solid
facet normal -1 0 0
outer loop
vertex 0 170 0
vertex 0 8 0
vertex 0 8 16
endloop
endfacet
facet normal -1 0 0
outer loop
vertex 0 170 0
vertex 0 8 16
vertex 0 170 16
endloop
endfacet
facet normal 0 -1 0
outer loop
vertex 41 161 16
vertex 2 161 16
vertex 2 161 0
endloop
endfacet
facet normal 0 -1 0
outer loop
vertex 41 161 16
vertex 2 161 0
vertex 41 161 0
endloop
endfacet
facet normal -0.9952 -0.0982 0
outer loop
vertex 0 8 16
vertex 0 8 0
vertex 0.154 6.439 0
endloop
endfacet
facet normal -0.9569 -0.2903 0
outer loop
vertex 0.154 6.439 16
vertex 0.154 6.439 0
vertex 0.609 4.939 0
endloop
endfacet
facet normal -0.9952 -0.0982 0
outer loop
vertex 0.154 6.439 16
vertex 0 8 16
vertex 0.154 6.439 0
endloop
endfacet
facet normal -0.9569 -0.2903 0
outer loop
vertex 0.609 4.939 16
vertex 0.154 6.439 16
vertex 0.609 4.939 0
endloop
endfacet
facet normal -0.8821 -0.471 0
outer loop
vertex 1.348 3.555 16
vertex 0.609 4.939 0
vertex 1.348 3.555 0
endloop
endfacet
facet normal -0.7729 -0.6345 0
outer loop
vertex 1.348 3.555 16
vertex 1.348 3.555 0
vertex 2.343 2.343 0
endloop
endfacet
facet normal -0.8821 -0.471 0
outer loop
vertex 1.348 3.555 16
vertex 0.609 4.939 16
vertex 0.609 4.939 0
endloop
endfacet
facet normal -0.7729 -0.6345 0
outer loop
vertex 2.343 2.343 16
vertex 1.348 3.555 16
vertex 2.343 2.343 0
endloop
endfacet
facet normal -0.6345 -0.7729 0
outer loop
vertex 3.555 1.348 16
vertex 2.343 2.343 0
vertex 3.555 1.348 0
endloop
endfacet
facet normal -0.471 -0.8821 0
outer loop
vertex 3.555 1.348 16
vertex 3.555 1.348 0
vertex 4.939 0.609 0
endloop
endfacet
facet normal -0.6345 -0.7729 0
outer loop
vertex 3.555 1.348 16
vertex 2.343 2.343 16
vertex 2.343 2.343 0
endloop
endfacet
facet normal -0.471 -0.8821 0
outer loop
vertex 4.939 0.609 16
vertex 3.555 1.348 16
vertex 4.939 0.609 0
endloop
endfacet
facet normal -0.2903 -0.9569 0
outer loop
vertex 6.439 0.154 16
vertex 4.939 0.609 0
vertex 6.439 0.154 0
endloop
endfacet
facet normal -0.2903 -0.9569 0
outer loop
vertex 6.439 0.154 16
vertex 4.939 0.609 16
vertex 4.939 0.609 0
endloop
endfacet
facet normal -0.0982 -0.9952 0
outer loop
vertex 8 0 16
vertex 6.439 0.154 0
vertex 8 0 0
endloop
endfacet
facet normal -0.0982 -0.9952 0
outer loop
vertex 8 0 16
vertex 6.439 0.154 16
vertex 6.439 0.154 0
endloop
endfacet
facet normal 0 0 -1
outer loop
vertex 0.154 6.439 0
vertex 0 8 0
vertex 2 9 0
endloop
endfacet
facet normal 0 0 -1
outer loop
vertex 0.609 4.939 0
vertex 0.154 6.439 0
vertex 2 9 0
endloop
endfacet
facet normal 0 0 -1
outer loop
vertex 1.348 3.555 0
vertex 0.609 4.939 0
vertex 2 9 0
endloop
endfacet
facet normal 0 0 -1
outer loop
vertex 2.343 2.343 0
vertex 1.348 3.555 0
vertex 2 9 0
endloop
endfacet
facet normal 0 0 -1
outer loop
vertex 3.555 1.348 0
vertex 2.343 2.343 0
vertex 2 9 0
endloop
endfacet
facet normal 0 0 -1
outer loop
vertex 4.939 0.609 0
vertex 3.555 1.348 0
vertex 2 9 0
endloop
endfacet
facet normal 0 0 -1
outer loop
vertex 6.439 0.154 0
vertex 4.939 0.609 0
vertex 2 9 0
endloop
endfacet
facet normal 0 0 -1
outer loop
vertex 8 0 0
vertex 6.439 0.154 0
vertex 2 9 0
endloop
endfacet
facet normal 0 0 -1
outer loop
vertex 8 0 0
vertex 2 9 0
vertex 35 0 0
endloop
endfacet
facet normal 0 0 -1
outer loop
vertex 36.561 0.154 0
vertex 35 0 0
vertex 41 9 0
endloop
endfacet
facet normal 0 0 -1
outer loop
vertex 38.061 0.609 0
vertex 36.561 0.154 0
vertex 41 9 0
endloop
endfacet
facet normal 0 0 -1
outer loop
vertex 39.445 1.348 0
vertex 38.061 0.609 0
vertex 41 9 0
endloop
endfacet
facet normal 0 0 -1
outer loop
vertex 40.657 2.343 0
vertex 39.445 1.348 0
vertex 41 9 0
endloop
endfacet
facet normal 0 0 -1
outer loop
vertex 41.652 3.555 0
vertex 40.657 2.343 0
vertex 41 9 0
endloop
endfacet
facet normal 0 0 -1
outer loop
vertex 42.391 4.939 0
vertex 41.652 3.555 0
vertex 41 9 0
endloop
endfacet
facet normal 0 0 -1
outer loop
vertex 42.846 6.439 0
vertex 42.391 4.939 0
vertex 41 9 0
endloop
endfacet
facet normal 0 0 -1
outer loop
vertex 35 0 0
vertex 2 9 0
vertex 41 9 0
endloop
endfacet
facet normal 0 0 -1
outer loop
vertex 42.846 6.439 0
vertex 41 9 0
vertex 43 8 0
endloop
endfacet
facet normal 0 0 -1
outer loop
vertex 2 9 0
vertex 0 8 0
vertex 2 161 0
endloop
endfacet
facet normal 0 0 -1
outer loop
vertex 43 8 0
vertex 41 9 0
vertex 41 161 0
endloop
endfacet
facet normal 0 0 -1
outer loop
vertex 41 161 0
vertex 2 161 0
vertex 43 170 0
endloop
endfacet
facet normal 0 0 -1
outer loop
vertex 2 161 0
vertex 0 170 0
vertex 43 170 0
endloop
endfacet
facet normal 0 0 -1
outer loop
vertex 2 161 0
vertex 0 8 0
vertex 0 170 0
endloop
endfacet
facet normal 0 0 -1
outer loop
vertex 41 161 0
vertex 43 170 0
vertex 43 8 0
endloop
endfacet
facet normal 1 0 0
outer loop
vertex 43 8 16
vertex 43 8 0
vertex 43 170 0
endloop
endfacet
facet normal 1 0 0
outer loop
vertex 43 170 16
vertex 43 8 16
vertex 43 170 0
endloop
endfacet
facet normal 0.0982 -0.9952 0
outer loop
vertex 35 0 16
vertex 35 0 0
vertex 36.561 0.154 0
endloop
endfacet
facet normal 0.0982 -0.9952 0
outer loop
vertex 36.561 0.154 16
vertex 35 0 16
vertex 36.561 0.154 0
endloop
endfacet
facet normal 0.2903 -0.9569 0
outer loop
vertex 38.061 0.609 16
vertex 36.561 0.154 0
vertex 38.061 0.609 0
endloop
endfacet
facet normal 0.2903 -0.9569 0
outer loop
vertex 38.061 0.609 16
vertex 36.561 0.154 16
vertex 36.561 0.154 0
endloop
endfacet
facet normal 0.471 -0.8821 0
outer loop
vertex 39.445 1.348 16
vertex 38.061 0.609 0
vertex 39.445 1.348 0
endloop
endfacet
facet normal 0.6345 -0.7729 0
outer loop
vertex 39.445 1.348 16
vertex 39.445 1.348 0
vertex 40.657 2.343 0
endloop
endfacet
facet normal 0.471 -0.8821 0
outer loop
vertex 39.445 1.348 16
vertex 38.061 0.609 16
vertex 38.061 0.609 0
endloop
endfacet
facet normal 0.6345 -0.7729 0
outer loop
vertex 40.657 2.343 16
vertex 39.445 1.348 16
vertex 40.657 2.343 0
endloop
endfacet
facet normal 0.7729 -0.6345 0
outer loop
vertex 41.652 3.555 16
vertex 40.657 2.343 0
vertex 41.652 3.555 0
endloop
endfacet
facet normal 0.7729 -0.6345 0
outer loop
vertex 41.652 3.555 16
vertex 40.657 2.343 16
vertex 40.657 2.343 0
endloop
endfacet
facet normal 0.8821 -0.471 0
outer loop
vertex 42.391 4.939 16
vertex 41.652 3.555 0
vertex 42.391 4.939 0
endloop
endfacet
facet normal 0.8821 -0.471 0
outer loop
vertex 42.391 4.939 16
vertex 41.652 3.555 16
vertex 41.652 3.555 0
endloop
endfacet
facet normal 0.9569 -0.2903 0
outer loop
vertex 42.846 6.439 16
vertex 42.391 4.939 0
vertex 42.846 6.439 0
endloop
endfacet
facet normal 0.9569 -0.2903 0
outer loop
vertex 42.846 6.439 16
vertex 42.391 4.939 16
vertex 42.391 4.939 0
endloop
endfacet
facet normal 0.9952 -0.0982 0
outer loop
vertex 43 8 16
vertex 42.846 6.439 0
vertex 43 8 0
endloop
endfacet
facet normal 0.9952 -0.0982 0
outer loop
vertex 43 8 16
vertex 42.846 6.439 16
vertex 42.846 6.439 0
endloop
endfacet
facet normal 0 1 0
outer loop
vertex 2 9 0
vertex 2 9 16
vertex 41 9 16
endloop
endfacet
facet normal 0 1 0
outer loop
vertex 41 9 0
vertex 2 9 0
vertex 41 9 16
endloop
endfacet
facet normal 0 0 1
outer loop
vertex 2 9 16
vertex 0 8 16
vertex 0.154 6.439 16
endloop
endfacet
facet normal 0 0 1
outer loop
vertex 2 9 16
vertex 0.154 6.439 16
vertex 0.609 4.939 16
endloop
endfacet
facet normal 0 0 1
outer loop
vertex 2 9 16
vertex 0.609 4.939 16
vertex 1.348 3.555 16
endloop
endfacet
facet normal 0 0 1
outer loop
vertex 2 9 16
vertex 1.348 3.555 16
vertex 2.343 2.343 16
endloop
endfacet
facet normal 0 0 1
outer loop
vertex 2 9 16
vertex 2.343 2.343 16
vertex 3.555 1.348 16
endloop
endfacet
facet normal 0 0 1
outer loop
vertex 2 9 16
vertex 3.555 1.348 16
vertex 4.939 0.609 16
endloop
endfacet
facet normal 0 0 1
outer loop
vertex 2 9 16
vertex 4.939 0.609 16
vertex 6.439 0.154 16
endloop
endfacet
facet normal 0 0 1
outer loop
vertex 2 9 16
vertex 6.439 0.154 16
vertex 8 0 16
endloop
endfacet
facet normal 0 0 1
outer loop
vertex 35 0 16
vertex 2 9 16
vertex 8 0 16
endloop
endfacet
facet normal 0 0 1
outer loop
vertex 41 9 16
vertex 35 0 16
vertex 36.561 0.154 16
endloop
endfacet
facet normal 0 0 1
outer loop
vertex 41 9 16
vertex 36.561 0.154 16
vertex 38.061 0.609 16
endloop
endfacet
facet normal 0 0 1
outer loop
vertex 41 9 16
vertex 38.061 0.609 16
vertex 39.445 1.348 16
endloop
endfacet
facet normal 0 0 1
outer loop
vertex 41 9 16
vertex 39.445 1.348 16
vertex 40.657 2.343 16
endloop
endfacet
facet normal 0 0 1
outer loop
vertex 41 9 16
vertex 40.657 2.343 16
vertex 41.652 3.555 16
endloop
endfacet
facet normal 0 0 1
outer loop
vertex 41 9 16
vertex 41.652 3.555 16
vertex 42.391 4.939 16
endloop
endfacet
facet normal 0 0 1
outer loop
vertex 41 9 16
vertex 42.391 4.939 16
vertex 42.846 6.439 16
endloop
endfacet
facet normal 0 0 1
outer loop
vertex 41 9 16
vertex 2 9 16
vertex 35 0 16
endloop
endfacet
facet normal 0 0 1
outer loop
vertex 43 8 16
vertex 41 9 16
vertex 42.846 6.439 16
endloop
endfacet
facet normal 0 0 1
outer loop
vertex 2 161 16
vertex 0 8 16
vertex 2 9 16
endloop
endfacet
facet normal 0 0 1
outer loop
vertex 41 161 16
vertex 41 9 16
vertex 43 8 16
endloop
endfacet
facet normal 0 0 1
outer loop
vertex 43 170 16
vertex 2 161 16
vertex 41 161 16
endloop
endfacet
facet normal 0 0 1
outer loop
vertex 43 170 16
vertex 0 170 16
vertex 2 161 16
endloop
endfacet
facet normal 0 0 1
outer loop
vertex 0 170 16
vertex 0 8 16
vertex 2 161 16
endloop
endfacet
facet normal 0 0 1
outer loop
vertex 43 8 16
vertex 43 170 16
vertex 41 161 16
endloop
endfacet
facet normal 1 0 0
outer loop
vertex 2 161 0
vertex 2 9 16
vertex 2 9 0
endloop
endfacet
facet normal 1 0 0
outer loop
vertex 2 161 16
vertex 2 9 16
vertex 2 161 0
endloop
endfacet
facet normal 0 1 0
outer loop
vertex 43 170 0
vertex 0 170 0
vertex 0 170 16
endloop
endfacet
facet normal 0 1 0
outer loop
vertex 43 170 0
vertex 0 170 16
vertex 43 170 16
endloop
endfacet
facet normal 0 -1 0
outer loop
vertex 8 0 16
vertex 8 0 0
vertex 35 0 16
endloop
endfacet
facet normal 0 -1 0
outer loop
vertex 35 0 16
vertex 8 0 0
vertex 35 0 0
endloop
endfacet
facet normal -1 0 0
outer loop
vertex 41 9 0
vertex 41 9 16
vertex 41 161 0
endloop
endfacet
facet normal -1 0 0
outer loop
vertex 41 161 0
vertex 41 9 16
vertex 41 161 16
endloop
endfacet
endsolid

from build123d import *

# Parameters (mm, degrees)
SKETCH_1_W          = 43
SKETCH_1_H          = 170
EXTRUDE_1_DEPTH     = 16
SKETCH_3_W          = 39
SKETCH_3_H          = 152
CUT_EXTRUDE_1_DEPTH = 177.08236709
FILLET_3_R          = 8


with BuildPart() as part:
    # Эскиз1 → Бобышка-Вытянуть1 (new body)
    with BuildSketch(Plane.XY):
        with Locations((21.5, 85)):
            Rectangle(SKETCH_1_W, SKETCH_1_H)
    extrude(amount=EXTRUDE_1_DEPTH)

    # Эскиз3 → Вырез-Вытянуть1 (cut, through all)
    with BuildSketch(Plane.XY.offset(16)):
        with Locations((21.5, 85)):
            Rectangle(SKETCH_3_W, SKETCH_3_H)
    extrude(amount=-CUT_EXTRUDE_1_DEPTH, mode=Mode.SUBTRACT)

    # Скругление3
    fillet_3_edges = [part.edges().sort_by_distance(p)[0] for p in [
        (43, 0, 8),
        (0, 0, 8),
    ]]
    fillet(fillet_3_edges, radius=FILLET_3_R)


solid = part.part
